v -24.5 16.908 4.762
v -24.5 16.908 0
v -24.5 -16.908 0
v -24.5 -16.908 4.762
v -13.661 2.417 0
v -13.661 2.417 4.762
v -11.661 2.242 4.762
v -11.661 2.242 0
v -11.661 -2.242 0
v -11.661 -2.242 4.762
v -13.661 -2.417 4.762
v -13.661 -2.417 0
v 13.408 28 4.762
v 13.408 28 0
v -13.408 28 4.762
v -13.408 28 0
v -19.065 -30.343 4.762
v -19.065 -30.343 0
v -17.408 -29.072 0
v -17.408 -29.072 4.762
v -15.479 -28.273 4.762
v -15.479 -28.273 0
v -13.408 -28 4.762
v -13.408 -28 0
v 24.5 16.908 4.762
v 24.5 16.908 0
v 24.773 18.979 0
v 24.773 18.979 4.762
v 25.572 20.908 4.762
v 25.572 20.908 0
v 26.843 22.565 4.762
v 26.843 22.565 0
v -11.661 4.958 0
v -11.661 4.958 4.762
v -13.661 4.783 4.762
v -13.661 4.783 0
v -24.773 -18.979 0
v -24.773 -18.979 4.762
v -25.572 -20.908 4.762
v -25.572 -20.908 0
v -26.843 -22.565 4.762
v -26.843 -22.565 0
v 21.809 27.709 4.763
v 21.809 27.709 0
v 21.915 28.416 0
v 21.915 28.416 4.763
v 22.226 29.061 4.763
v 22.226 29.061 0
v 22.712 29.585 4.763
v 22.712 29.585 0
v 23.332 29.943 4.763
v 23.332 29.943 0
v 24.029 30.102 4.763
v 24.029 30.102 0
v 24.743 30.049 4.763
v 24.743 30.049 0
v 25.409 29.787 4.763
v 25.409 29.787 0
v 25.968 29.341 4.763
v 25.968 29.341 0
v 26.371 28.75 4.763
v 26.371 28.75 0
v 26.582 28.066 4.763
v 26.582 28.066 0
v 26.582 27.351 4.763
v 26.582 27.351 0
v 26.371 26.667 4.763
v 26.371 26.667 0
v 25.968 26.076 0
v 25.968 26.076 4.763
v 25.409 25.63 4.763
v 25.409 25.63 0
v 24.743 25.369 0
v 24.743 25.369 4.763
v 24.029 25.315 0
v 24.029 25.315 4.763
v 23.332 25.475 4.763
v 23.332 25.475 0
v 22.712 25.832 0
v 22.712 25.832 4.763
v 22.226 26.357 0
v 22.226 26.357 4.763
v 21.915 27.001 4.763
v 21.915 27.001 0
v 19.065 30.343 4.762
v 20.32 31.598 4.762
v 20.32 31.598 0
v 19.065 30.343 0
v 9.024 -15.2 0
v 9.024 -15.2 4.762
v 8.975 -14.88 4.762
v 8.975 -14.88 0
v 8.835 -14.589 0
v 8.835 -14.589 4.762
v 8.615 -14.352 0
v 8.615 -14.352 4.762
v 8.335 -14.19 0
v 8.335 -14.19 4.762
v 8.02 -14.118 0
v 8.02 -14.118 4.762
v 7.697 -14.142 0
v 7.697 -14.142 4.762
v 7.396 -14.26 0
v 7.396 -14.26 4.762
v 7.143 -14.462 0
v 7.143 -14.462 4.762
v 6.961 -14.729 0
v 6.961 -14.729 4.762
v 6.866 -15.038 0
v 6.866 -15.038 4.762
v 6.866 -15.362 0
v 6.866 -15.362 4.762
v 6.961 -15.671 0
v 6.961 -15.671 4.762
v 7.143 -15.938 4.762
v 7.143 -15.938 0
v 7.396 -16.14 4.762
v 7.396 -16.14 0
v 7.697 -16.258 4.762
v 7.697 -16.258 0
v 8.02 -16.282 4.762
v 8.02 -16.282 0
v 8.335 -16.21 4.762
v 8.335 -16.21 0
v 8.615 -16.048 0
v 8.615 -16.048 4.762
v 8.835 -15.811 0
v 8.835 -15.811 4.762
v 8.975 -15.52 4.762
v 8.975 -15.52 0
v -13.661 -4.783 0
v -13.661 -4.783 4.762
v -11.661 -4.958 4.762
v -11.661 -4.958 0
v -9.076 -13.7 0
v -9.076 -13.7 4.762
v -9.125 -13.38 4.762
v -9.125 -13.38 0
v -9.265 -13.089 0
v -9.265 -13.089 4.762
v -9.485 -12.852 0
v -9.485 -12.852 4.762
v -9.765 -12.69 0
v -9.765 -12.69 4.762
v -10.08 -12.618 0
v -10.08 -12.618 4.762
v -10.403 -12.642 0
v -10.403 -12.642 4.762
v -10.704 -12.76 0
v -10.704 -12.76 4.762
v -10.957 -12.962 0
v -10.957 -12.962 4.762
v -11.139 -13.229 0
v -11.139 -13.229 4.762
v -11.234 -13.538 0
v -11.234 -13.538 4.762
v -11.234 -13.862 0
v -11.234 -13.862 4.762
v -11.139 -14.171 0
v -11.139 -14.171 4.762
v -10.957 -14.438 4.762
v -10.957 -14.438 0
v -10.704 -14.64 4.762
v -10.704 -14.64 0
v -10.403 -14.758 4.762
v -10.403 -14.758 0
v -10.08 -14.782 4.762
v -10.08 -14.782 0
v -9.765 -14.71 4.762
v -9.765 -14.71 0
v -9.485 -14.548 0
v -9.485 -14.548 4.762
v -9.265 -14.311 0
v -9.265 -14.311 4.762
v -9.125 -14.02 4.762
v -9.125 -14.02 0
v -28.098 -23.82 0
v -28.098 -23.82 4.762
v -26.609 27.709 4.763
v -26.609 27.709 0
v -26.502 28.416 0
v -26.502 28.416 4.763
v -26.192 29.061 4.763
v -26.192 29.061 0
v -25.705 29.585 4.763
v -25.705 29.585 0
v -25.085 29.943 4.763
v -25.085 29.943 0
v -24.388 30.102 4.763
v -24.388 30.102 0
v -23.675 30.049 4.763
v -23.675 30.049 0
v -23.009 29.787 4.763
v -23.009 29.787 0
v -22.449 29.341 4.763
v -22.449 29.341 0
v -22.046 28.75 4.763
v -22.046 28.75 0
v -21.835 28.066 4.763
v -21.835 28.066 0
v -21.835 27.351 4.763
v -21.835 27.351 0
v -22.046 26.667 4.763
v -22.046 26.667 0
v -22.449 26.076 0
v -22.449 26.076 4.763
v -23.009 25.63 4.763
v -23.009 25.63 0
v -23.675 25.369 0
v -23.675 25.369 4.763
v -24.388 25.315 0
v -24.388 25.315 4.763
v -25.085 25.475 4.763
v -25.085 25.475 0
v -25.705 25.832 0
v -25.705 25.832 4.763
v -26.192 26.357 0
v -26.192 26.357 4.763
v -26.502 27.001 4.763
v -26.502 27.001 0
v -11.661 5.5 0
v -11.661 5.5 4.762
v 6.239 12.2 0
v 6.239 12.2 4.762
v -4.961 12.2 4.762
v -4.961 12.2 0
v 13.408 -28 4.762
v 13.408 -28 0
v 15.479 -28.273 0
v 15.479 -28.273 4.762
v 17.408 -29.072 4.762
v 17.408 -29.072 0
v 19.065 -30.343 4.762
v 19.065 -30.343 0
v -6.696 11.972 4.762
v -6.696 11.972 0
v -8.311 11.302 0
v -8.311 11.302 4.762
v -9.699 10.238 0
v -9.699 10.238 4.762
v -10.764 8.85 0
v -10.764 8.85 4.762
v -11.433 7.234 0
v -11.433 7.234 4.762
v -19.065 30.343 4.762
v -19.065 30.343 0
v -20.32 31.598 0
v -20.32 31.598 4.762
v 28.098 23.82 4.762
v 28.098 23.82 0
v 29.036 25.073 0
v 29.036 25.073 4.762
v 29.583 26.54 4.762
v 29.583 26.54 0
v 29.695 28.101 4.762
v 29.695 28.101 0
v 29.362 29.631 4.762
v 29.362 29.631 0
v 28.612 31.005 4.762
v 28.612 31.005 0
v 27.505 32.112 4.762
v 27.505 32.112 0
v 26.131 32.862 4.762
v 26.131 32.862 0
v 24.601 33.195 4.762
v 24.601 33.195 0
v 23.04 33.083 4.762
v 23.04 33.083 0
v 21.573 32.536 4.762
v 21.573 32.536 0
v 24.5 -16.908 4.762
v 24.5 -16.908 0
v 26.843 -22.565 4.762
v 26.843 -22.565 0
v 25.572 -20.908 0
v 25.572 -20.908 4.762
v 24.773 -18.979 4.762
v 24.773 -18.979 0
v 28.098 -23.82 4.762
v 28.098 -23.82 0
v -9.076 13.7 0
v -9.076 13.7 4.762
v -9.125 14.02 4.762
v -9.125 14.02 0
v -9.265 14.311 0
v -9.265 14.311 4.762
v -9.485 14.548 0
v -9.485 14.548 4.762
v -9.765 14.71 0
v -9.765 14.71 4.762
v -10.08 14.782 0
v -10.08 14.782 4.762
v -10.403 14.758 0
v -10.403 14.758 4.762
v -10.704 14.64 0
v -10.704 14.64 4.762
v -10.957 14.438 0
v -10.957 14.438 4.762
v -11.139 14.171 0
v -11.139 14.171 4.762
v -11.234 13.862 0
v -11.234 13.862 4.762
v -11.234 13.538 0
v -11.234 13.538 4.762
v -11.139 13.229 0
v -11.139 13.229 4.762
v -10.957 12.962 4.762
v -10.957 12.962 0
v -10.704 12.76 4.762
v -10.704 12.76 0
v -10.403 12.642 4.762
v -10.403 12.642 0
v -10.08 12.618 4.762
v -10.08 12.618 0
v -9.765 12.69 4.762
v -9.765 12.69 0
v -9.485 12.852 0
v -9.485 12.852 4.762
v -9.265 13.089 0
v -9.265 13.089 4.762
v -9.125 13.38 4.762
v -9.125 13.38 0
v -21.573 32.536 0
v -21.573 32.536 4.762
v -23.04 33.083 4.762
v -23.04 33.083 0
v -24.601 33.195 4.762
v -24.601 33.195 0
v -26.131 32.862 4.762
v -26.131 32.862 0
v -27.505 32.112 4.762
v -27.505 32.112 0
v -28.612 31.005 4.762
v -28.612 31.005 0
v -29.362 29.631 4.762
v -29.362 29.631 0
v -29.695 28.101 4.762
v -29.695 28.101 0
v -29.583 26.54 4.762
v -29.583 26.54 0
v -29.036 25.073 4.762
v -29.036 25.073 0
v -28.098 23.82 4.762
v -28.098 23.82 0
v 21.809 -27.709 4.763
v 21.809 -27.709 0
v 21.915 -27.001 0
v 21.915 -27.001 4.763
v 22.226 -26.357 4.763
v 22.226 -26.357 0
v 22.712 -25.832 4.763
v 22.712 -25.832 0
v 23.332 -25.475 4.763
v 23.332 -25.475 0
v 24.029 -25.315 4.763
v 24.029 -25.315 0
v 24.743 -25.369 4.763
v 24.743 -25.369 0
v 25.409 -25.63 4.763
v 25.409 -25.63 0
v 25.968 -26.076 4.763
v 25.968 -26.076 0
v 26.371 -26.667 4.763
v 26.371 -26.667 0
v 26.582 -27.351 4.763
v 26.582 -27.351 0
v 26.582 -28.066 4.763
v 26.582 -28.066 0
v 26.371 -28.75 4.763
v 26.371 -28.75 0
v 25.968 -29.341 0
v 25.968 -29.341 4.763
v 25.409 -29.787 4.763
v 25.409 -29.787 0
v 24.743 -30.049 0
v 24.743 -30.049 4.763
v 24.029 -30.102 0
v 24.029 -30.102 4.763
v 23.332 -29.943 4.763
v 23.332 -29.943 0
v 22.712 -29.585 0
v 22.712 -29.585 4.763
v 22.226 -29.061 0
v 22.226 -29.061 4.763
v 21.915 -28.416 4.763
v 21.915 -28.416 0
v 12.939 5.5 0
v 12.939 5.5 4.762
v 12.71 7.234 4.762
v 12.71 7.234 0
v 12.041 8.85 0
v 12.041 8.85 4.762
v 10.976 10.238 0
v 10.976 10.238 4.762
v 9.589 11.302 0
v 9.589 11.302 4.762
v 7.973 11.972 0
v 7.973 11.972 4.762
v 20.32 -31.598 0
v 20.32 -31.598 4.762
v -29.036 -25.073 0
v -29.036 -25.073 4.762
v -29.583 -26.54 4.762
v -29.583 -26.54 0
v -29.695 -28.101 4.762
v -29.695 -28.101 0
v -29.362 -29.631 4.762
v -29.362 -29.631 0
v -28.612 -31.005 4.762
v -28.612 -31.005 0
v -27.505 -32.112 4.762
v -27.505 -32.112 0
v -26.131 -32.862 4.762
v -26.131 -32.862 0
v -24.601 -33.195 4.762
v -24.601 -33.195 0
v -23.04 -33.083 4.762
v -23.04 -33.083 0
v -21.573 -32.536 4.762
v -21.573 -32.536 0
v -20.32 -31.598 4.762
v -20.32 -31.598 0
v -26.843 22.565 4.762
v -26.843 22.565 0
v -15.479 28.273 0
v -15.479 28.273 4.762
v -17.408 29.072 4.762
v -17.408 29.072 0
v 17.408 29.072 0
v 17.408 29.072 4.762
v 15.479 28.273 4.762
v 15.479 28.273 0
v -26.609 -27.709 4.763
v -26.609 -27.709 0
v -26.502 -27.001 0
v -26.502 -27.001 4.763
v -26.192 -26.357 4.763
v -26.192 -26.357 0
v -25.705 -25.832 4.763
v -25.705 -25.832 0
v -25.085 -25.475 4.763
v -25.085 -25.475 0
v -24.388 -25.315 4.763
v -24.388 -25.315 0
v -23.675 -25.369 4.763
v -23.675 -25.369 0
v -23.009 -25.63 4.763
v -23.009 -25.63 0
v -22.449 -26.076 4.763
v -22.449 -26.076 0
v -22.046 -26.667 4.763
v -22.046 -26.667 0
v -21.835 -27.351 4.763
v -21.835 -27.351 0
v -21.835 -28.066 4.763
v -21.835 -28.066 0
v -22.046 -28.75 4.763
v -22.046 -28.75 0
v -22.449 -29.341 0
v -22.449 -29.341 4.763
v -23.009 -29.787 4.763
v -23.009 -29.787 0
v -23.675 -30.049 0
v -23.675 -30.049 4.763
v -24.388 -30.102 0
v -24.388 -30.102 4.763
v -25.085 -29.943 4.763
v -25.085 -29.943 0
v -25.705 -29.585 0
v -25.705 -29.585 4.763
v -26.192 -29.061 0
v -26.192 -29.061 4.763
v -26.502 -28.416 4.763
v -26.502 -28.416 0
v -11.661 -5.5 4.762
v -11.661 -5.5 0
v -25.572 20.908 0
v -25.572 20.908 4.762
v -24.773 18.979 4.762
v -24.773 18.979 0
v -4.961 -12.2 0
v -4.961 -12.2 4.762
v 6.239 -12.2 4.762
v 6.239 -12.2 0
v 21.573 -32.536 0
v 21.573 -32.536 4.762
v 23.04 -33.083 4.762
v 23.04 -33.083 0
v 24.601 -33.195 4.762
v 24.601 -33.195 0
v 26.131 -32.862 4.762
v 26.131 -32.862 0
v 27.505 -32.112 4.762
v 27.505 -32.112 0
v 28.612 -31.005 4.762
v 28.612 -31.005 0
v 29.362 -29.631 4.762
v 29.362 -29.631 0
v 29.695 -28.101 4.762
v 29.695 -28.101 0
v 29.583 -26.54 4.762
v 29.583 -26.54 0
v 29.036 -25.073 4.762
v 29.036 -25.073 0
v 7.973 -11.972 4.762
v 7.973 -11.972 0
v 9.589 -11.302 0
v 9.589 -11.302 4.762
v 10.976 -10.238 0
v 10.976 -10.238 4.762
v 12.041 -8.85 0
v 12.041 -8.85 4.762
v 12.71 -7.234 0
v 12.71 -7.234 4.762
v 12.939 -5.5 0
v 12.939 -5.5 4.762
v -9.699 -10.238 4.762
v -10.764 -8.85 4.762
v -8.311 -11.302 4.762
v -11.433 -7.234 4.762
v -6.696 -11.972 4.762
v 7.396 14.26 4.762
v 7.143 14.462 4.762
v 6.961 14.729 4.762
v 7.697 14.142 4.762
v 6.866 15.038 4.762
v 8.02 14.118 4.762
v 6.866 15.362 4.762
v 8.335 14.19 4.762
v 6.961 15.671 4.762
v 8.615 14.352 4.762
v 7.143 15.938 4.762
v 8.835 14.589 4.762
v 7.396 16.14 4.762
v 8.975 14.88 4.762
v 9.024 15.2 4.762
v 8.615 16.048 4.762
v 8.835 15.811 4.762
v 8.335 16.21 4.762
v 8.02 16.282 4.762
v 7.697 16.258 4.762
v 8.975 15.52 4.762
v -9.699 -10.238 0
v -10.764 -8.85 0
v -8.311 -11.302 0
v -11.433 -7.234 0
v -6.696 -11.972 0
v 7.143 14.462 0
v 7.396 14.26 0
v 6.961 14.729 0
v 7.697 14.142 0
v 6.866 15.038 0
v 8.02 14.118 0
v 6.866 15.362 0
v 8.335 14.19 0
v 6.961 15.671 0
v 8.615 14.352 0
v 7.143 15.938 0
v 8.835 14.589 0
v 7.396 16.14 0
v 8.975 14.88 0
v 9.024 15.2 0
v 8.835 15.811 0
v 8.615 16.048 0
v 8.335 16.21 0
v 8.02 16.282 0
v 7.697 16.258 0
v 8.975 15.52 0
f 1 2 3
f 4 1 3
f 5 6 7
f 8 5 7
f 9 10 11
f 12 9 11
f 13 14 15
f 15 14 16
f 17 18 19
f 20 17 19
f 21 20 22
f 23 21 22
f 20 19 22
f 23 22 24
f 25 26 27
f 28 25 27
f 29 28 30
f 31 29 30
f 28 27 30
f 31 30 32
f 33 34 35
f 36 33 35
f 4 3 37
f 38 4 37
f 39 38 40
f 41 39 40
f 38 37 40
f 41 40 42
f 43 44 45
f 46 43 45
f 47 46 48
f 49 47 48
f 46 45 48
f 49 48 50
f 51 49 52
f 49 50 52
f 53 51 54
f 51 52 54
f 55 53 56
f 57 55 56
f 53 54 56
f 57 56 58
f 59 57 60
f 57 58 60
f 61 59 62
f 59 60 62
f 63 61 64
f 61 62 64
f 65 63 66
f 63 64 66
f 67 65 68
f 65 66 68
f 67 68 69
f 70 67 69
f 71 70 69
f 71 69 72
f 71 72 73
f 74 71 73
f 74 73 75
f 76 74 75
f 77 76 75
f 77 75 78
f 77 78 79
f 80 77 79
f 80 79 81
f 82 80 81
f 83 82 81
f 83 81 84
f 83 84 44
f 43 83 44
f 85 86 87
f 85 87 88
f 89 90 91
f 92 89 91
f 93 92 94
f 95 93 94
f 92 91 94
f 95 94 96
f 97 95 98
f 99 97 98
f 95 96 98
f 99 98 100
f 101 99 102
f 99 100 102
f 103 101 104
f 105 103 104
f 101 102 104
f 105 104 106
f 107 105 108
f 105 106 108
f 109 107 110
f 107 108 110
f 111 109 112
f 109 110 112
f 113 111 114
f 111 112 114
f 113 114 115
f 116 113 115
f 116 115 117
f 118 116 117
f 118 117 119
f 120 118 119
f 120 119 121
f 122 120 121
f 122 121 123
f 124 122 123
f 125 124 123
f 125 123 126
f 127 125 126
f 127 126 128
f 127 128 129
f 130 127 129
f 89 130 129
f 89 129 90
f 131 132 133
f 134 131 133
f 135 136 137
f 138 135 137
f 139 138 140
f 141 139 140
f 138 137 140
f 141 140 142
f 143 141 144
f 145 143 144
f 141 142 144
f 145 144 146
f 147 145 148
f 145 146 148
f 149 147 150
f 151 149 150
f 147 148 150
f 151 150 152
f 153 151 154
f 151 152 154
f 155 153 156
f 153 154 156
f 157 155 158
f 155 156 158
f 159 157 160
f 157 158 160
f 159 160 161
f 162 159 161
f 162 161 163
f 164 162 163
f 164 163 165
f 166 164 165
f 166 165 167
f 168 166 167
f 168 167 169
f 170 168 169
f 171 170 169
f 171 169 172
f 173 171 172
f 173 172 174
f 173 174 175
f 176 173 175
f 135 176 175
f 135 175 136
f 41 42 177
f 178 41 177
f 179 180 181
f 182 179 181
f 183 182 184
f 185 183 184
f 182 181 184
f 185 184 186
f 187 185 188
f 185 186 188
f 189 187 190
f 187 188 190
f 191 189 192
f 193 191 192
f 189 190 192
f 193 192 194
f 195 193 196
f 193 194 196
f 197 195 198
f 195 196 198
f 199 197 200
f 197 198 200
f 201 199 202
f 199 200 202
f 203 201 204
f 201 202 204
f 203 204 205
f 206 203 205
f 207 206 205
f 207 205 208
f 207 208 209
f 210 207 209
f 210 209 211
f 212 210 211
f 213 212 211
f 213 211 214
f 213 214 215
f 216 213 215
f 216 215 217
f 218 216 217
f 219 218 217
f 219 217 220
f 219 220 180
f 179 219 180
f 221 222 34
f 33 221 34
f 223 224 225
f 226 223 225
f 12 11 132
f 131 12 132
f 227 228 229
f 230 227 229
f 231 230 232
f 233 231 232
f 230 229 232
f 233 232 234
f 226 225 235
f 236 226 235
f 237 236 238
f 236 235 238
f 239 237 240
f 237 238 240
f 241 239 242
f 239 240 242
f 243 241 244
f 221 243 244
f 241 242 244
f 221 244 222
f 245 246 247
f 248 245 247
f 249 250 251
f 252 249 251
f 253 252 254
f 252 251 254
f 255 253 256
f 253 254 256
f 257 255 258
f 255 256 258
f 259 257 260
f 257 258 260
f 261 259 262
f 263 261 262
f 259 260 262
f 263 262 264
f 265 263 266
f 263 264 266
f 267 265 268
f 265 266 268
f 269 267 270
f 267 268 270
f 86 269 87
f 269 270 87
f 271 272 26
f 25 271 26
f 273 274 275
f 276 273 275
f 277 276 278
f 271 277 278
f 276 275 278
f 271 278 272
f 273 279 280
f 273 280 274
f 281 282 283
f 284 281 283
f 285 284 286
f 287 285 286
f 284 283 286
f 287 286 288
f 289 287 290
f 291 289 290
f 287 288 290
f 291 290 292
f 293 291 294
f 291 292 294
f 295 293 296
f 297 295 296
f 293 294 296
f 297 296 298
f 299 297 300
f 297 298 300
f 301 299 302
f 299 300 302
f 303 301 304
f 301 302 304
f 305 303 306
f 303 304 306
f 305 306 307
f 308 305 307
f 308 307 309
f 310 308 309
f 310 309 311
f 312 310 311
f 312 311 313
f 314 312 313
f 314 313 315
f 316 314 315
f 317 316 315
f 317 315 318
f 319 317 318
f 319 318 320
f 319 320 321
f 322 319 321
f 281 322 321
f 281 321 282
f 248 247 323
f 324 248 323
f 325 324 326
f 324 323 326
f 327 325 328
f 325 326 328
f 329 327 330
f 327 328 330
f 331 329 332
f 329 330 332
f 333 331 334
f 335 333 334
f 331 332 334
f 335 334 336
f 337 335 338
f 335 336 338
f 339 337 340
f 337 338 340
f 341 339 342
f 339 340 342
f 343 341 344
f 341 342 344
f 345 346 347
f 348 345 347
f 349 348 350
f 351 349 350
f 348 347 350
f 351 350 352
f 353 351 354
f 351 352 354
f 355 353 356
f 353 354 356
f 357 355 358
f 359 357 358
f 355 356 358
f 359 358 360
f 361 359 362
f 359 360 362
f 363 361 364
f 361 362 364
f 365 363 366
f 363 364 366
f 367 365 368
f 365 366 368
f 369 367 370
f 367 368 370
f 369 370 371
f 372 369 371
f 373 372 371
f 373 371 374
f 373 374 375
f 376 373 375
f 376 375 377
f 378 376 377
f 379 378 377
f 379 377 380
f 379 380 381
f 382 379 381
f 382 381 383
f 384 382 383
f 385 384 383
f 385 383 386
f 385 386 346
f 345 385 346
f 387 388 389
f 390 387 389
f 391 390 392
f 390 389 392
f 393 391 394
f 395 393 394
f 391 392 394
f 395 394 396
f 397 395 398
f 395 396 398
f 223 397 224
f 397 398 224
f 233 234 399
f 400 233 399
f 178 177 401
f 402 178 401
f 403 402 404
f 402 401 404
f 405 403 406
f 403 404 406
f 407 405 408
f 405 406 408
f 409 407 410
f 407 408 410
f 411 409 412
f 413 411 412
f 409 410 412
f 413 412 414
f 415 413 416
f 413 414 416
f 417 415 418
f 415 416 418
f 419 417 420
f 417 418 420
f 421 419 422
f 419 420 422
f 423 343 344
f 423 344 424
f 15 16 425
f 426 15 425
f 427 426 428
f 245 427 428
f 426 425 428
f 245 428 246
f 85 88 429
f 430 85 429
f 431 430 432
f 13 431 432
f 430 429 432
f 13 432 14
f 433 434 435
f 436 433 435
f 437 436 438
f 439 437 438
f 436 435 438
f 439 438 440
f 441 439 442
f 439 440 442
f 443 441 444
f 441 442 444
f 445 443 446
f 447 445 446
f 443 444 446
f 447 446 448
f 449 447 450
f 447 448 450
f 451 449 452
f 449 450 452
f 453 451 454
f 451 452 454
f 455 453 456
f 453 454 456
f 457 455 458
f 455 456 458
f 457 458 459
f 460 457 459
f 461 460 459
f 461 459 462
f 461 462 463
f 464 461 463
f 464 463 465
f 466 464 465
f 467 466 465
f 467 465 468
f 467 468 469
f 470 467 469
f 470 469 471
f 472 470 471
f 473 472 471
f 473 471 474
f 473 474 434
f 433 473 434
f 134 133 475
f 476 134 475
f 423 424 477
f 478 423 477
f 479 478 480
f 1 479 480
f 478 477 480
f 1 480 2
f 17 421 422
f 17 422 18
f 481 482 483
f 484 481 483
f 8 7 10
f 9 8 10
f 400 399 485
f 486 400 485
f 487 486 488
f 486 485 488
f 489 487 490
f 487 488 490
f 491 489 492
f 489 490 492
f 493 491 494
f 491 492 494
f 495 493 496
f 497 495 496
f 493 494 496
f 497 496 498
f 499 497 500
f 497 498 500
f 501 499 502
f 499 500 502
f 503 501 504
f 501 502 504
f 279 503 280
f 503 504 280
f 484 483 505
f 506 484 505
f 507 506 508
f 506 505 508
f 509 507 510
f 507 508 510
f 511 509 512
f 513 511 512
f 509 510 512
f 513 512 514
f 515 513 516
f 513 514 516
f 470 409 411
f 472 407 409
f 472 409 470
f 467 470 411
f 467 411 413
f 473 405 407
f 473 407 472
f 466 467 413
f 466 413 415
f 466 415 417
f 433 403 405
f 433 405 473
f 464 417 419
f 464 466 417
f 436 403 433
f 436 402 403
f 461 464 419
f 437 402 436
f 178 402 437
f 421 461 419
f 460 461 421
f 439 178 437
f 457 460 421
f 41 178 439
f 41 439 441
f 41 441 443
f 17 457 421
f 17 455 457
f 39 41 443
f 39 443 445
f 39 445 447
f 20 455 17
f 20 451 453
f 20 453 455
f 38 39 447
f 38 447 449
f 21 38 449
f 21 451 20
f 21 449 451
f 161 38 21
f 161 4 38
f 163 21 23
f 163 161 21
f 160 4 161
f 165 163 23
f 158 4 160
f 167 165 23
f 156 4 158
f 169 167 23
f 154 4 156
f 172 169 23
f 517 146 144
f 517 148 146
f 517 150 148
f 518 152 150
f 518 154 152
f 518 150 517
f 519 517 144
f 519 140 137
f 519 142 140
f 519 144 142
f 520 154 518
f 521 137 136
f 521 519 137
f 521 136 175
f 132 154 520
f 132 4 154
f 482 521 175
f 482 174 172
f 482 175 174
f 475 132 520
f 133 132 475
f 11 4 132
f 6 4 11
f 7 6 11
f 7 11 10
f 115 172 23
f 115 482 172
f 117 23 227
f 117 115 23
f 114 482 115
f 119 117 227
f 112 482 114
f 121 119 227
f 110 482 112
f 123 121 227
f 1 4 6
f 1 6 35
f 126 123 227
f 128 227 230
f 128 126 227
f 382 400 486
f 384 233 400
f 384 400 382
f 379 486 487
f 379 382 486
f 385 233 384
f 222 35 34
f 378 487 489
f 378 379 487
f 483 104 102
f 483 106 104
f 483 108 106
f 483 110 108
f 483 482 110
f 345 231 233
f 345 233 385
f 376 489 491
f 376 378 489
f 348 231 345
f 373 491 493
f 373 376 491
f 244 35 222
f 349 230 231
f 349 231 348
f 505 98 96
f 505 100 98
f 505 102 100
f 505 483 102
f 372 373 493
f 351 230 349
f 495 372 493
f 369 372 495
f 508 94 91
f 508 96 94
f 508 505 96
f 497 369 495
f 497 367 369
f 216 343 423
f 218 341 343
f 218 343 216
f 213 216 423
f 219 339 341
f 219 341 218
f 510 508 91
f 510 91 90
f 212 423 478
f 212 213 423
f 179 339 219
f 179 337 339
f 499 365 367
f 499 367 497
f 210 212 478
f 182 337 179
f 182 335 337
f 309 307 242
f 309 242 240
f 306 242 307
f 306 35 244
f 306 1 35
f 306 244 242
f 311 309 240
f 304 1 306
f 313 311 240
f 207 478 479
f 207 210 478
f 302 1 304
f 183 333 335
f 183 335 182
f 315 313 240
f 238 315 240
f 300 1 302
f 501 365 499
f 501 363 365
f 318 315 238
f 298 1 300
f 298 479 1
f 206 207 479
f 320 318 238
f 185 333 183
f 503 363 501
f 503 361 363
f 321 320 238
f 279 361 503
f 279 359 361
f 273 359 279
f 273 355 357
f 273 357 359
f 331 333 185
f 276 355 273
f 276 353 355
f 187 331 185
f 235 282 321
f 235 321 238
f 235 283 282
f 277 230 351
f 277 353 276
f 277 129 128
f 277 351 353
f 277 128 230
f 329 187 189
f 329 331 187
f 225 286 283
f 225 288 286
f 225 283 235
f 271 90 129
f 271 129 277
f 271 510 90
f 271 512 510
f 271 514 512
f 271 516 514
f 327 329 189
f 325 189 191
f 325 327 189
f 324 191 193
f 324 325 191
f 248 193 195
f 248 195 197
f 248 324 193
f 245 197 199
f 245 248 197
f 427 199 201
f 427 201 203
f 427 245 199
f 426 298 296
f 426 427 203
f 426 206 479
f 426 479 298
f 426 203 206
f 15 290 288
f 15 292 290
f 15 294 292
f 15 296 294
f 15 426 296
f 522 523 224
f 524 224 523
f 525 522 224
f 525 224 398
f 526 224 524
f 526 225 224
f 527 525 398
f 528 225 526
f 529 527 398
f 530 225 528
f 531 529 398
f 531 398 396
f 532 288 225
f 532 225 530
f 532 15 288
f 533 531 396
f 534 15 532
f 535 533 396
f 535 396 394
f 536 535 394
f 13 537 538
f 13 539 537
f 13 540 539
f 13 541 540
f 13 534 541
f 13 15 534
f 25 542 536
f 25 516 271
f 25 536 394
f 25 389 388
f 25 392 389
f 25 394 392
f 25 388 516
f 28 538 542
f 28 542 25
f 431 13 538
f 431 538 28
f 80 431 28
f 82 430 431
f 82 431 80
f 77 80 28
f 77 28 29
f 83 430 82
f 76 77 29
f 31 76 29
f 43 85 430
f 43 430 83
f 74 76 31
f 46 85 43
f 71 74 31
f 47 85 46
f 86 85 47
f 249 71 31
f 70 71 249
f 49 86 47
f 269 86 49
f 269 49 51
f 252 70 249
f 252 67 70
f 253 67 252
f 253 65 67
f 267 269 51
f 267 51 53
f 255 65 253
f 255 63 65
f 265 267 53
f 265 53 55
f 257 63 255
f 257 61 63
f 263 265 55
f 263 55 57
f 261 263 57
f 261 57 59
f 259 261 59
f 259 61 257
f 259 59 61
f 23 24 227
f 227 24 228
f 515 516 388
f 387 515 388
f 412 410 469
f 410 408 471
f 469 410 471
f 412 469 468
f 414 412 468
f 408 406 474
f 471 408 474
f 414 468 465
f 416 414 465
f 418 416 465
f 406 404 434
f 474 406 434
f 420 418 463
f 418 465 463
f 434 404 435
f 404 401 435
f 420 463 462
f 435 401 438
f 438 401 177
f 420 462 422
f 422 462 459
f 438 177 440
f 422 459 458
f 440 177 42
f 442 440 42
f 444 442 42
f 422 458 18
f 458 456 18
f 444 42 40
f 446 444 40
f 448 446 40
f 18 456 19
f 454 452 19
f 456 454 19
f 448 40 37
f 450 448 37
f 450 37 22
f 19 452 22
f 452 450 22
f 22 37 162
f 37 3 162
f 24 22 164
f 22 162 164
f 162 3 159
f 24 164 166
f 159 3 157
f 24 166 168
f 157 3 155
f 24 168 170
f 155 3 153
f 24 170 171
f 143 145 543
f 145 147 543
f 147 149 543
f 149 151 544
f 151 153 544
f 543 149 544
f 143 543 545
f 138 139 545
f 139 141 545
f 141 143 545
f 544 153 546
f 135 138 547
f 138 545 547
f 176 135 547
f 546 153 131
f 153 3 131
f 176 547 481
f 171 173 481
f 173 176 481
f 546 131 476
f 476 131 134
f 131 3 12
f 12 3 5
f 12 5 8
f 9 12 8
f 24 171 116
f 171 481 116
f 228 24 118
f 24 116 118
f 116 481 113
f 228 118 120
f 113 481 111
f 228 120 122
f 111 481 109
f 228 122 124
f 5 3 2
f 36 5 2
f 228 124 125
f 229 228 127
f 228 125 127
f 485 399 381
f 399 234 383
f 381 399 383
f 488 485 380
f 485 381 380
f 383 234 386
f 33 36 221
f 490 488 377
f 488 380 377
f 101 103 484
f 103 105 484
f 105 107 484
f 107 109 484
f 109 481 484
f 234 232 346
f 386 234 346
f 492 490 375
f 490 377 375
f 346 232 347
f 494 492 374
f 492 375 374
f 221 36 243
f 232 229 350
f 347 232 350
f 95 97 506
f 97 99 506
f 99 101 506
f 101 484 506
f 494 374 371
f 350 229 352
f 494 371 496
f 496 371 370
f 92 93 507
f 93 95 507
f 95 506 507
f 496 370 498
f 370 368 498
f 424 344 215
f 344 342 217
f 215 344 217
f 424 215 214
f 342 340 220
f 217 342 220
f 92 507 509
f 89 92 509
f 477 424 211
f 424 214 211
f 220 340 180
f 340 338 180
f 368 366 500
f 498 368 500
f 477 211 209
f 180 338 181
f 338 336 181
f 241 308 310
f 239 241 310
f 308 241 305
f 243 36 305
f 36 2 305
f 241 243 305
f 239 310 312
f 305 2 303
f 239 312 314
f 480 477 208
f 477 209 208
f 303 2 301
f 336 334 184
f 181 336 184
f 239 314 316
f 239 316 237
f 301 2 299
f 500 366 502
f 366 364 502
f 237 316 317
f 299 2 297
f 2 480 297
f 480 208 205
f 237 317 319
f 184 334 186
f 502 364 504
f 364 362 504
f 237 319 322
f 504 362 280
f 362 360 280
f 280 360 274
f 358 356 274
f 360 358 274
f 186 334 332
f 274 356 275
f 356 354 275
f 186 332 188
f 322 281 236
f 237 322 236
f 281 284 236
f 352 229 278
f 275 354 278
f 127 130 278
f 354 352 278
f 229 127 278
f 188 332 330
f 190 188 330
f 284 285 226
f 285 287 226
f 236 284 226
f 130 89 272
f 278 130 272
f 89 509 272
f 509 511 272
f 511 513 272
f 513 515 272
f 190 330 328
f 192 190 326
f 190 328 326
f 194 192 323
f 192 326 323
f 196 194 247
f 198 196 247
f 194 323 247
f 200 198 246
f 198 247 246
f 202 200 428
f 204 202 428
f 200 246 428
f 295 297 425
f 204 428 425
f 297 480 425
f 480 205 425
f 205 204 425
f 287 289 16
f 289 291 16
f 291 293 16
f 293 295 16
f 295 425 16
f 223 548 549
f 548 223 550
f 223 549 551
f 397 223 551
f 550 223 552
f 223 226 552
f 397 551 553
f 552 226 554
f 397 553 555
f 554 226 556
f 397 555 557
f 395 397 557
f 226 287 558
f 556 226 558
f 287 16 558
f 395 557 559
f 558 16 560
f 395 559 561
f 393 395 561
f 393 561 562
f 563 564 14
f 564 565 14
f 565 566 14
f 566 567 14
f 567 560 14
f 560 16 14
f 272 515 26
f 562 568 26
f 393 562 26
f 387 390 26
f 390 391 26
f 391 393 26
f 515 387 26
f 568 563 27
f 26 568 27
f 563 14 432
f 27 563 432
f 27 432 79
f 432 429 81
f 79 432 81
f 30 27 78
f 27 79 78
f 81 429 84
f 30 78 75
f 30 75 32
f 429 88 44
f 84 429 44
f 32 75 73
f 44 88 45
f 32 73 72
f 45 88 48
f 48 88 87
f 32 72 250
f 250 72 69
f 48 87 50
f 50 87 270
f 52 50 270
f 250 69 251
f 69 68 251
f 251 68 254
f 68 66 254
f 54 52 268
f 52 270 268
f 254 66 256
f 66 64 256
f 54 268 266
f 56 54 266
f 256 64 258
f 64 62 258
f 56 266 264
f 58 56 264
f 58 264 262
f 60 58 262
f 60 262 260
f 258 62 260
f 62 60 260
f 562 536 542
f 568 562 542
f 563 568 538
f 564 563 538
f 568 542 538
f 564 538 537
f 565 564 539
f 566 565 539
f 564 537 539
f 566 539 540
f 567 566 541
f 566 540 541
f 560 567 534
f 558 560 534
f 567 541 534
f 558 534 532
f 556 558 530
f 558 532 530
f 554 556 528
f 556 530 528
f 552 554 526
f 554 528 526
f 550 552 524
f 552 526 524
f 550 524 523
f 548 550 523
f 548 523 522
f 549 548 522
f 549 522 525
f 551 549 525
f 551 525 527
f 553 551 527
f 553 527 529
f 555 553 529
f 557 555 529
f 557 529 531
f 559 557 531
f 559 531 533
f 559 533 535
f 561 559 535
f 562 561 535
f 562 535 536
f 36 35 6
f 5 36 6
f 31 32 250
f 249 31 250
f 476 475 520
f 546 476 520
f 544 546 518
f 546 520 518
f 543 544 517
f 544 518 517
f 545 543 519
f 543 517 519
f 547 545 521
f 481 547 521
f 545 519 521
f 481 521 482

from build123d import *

# Parameters (mm, degrees)
BOSS_EXTRUDE1_DEPTH  = 4.7625
M4_CLEARANCE_HOLE1_D = 4.8
SKETCH5_R            = 1.085
CUT_EXTRUDE1_DEPTH   = 45.811860093


with BuildPart() as part:
    # Sketch1 → Boss-Extrude1 (new body)
    with BuildSketch(Plane.XY):
        with BuildLine():
            Line((-20.319587173, -31.597761766), (-19.064971157, -30.343145751))
            ThreePointArc((-19.064971157, -30.343145751), (-16.469584367, -28.60896374), (-13.408116908, -28))
            Line((-13.408116908, -28), (13.408116908, -28))
            ThreePointArc((13.408116908, -28), (16.469584367, -28.60896374), (19.064971157, -30.343145751))
            Line((19.064971157, -30.343145751), (20.319587173, -31.597761766))
            ThreePointArc((20.319587173, -31.597761766), (28.097761766, -31.597761766), (28.097761766, -23.819587173))
            Line((28.097761766, -23.819587173), (26.843145751, -22.564971157))
            ThreePointArc((26.843145751, -22.564971157), (25.10896374, -19.969584367), (24.5, -16.908116908))
            Line((24.5, -16.908116908), (24.5, 16.908116908))
            ThreePointArc((24.5, 16.908116908), (25.10896374, 19.969584367), (26.843145751, 22.564971157))
            Line((26.843145751, 22.564971157), (28.097761766, 23.819587173))
            ThreePointArc((28.097761766, 23.819587173), (28.097761766, 31.597761766), (20.319587173, 31.597761766))
            Line((20.319587173, 31.597761766), (19.064971157, 30.343145751))
            ThreePointArc((19.064971157, 30.343145751), (16.469584367, 28.60896374), (13.408116908, 28))
            Line((13.408116908, 28), (-13.408116908, 28))
            ThreePointArc((-13.408116908, 28), (-16.469584367, 28.60896374), (-19.064971157, 30.343145751))
            Line((-19.064971157, 30.343145751), (-20.319587173, 31.597761766))
            ThreePointArc((-20.319587173, 31.597761766), (-28.097761766, 31.597761766), (-28.097761766, 23.819587173))
            Line((-28.097761766, 23.819587173), (-26.843145751, 22.564971157))
            ThreePointArc((-26.843145751, 22.564971157), (-25.10896374, 19.969584367), (-24.5, 16.908116908))
            Line((-24.5, 16.908116908), (-24.5, -16.908116908))
            ThreePointArc((-24.5, -16.908116908), (-25.10896374, -19.969584367), (-26.843145751, -22.564971157))
            Line((-26.843145751, -22.564971157), (-28.097761766, -23.819587173))
            ThreePointArc((-28.097761766, -23.819587173), (-28.097761766, -31.597761766), (-20.319587173, -31.597761766))
        make_face()
    extrude(amount=BOSS_EXTRUDE1_DEPTH)

    # M4 Clearance Hole1 (through all)
    with Locations(Plane.XY.offset(4.7625)):
        with Locations((-24.20867447, 27.70867447), (24.20867447, 27.70867447), (24.20867447, -27.70867447), (-24.20867447, -27.70867447)):
            Hole(M4_CLEARANCE_HOLE1_D / 2)

    # Sketch5 → Cut-Extrude1 (cut, through all)
    with BuildSketch(Plane.XY.offset(4.7625)):
        with BuildLine():
            Line((-13.66148, -4.78318826), (-11.66148, -4.958165587))
            Line((-11.66148, -4.958165587), (-11.66148, -5.5))
            ThreePointArc((-11.66148, -5.5), (-9.699095434, -10.237615434), (-4.96148, -12.2))
            Line((-4.96148, -12.2), (6.23852, -12.2))
            ThreePointArc((6.23852, -12.2), (10.976135434, -10.237615434), (12.93852, -5.5))
            Line((12.93852, -5.5), (12.93852, 5.5))
            ThreePointArc((12.93852, 5.5), (10.976135434, 10.237615434), (6.23852, 12.2))
            Line((6.23852, 12.2), (-4.96148, 12.2))
            ThreePointArc((-4.96148, 12.2), (-9.699095434, 10.237615434), (-11.66148, 5.5))
            Line((-11.66148, 5.5), (-11.66148, 4.958165587))
            Line((-11.66148, 4.958165587), (-13.66148, 4.78318826))
            Line((-13.66148, 4.78318826), (-13.66148, 2.41681174))
            Line((-13.66148, 2.41681174), (-11.66148, 2.241834413))
            Line((-11.66148, 2.241834413), (-11.66148, -2.241834413))
            Line((-11.66148, -2.241834413), (-13.66148, -2.41681174))
            Line((-13.66148, -2.41681174), (-13.66148, -4.78318826))
        make_face()
        with Locations((-10.16148, -13.7)):
            Circle(SKETCH5_R)
        with Locations((-10.16148, 13.7)):
            Circle(SKETCH5_R)
        with Locations((7.93852, 15.2)):
            Circle(SKETCH5_R)
        with Locations((7.93852, -15.2)):
            Circle(SKETCH5_R)
    extrude(amount=-CUT_EXTRUDE1_DEPTH, mode=Mode.SUBTRACT)


solid = part.part
